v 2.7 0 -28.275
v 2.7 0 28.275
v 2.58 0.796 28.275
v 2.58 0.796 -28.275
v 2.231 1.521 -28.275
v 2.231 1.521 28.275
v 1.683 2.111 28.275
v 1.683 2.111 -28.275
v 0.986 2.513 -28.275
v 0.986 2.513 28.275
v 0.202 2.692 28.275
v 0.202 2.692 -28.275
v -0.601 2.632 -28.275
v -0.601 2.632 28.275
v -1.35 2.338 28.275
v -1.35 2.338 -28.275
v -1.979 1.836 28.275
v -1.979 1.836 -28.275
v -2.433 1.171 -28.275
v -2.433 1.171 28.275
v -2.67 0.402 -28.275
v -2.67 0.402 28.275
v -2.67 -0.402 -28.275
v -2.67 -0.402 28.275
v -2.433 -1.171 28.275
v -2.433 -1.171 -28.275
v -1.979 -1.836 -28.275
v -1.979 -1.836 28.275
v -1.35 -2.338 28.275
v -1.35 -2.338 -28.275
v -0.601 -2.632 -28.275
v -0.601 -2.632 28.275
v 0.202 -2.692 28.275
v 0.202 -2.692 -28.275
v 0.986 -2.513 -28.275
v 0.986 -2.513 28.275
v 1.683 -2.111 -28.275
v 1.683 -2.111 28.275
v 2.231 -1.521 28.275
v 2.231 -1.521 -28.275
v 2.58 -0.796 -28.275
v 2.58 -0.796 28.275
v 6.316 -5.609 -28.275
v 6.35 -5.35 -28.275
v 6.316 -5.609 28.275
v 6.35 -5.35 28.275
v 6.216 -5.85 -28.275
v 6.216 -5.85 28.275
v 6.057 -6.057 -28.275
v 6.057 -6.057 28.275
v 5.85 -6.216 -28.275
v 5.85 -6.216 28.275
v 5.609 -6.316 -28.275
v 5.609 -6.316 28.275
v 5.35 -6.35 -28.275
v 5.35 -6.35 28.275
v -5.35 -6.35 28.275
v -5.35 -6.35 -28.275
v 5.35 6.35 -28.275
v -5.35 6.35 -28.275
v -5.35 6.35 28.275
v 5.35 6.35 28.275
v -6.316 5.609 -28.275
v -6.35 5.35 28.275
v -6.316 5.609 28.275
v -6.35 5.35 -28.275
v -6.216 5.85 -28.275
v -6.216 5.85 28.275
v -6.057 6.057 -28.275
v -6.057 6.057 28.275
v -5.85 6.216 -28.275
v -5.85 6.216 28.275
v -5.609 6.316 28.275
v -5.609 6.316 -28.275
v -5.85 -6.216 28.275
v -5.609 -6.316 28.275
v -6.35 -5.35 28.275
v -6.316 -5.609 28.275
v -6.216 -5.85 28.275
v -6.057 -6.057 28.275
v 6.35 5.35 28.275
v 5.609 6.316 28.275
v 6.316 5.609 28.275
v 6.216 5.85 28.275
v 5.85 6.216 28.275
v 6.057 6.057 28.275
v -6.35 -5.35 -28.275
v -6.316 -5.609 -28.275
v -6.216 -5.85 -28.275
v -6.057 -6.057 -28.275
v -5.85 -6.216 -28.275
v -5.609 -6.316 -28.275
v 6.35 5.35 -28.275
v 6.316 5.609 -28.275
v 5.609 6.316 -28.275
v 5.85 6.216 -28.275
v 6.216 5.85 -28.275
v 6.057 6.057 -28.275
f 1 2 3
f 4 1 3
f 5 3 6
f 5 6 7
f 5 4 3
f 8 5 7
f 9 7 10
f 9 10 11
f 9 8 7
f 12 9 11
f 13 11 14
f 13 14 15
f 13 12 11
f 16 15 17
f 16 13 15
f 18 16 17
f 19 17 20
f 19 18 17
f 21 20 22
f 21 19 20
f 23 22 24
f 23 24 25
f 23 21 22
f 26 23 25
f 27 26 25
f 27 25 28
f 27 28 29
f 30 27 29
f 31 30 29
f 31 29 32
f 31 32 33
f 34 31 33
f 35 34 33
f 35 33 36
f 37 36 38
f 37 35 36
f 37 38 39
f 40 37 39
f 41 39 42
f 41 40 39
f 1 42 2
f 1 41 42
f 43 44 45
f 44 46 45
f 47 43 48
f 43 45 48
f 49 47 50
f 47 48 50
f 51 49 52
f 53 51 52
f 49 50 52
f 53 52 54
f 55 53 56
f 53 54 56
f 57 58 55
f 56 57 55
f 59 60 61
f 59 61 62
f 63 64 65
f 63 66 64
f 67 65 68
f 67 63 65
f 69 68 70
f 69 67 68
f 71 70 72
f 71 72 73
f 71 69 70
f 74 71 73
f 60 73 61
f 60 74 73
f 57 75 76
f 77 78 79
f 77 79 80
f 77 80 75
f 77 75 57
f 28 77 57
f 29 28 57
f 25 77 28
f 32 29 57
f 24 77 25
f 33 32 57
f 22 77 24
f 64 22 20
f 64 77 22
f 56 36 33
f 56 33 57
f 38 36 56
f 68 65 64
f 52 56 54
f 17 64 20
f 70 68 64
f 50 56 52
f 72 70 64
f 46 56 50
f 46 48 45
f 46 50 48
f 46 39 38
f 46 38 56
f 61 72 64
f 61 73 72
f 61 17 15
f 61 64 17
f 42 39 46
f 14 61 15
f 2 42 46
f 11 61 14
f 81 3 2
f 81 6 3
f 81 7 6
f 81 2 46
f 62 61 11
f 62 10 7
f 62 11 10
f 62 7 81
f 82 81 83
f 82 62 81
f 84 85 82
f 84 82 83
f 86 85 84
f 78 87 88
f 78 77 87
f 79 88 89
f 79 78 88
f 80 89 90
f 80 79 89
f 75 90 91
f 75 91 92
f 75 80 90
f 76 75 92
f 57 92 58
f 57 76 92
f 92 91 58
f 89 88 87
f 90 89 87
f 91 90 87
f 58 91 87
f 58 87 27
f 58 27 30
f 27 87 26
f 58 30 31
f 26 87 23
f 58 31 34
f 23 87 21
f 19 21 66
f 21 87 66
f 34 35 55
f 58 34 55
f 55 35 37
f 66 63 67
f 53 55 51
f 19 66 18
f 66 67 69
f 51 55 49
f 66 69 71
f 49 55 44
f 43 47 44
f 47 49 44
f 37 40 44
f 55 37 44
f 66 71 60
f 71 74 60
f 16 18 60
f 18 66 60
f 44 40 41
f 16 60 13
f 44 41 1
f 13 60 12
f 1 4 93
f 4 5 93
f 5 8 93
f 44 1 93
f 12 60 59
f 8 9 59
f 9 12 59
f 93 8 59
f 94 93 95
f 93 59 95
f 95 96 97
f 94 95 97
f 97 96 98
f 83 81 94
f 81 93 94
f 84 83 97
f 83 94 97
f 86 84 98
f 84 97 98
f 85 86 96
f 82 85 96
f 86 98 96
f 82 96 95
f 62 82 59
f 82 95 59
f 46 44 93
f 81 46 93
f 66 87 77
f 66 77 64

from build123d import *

# Parameters (mm, degrees)
SKETCH1_W           = 12.7
SKETCH1_H           = 12.7
SKETCH1_R           = 2.7
BOSS_EXTRUDE1_DEPTH = 28.275
FILLET2_R           = 1


with BuildPart() as part:
    # Sketch1 → Boss-Extrude1 (new, symmetric)
    with BuildSketch(Plane.XY):
        Rectangle(SKETCH1_W, SKETCH1_H)
        Circle(SKETCH1_R, mode=Mode.SUBTRACT)
    extrude(amount=BOSS_EXTRUDE1_DEPTH, both=True)

    # Fillet2
    fillet2_edges = [part.edges().sort_by_distance(p)[0] for p in [
        (6.35, -6.35, 0),
        (-6.35, -6.35, 0),
        (-6.35, 6.35, 0),
        (6.35, 6.35, 0),
    ]]
    fillet(fillet2_edges, radius=FILLET2_R)


solid = part.part
